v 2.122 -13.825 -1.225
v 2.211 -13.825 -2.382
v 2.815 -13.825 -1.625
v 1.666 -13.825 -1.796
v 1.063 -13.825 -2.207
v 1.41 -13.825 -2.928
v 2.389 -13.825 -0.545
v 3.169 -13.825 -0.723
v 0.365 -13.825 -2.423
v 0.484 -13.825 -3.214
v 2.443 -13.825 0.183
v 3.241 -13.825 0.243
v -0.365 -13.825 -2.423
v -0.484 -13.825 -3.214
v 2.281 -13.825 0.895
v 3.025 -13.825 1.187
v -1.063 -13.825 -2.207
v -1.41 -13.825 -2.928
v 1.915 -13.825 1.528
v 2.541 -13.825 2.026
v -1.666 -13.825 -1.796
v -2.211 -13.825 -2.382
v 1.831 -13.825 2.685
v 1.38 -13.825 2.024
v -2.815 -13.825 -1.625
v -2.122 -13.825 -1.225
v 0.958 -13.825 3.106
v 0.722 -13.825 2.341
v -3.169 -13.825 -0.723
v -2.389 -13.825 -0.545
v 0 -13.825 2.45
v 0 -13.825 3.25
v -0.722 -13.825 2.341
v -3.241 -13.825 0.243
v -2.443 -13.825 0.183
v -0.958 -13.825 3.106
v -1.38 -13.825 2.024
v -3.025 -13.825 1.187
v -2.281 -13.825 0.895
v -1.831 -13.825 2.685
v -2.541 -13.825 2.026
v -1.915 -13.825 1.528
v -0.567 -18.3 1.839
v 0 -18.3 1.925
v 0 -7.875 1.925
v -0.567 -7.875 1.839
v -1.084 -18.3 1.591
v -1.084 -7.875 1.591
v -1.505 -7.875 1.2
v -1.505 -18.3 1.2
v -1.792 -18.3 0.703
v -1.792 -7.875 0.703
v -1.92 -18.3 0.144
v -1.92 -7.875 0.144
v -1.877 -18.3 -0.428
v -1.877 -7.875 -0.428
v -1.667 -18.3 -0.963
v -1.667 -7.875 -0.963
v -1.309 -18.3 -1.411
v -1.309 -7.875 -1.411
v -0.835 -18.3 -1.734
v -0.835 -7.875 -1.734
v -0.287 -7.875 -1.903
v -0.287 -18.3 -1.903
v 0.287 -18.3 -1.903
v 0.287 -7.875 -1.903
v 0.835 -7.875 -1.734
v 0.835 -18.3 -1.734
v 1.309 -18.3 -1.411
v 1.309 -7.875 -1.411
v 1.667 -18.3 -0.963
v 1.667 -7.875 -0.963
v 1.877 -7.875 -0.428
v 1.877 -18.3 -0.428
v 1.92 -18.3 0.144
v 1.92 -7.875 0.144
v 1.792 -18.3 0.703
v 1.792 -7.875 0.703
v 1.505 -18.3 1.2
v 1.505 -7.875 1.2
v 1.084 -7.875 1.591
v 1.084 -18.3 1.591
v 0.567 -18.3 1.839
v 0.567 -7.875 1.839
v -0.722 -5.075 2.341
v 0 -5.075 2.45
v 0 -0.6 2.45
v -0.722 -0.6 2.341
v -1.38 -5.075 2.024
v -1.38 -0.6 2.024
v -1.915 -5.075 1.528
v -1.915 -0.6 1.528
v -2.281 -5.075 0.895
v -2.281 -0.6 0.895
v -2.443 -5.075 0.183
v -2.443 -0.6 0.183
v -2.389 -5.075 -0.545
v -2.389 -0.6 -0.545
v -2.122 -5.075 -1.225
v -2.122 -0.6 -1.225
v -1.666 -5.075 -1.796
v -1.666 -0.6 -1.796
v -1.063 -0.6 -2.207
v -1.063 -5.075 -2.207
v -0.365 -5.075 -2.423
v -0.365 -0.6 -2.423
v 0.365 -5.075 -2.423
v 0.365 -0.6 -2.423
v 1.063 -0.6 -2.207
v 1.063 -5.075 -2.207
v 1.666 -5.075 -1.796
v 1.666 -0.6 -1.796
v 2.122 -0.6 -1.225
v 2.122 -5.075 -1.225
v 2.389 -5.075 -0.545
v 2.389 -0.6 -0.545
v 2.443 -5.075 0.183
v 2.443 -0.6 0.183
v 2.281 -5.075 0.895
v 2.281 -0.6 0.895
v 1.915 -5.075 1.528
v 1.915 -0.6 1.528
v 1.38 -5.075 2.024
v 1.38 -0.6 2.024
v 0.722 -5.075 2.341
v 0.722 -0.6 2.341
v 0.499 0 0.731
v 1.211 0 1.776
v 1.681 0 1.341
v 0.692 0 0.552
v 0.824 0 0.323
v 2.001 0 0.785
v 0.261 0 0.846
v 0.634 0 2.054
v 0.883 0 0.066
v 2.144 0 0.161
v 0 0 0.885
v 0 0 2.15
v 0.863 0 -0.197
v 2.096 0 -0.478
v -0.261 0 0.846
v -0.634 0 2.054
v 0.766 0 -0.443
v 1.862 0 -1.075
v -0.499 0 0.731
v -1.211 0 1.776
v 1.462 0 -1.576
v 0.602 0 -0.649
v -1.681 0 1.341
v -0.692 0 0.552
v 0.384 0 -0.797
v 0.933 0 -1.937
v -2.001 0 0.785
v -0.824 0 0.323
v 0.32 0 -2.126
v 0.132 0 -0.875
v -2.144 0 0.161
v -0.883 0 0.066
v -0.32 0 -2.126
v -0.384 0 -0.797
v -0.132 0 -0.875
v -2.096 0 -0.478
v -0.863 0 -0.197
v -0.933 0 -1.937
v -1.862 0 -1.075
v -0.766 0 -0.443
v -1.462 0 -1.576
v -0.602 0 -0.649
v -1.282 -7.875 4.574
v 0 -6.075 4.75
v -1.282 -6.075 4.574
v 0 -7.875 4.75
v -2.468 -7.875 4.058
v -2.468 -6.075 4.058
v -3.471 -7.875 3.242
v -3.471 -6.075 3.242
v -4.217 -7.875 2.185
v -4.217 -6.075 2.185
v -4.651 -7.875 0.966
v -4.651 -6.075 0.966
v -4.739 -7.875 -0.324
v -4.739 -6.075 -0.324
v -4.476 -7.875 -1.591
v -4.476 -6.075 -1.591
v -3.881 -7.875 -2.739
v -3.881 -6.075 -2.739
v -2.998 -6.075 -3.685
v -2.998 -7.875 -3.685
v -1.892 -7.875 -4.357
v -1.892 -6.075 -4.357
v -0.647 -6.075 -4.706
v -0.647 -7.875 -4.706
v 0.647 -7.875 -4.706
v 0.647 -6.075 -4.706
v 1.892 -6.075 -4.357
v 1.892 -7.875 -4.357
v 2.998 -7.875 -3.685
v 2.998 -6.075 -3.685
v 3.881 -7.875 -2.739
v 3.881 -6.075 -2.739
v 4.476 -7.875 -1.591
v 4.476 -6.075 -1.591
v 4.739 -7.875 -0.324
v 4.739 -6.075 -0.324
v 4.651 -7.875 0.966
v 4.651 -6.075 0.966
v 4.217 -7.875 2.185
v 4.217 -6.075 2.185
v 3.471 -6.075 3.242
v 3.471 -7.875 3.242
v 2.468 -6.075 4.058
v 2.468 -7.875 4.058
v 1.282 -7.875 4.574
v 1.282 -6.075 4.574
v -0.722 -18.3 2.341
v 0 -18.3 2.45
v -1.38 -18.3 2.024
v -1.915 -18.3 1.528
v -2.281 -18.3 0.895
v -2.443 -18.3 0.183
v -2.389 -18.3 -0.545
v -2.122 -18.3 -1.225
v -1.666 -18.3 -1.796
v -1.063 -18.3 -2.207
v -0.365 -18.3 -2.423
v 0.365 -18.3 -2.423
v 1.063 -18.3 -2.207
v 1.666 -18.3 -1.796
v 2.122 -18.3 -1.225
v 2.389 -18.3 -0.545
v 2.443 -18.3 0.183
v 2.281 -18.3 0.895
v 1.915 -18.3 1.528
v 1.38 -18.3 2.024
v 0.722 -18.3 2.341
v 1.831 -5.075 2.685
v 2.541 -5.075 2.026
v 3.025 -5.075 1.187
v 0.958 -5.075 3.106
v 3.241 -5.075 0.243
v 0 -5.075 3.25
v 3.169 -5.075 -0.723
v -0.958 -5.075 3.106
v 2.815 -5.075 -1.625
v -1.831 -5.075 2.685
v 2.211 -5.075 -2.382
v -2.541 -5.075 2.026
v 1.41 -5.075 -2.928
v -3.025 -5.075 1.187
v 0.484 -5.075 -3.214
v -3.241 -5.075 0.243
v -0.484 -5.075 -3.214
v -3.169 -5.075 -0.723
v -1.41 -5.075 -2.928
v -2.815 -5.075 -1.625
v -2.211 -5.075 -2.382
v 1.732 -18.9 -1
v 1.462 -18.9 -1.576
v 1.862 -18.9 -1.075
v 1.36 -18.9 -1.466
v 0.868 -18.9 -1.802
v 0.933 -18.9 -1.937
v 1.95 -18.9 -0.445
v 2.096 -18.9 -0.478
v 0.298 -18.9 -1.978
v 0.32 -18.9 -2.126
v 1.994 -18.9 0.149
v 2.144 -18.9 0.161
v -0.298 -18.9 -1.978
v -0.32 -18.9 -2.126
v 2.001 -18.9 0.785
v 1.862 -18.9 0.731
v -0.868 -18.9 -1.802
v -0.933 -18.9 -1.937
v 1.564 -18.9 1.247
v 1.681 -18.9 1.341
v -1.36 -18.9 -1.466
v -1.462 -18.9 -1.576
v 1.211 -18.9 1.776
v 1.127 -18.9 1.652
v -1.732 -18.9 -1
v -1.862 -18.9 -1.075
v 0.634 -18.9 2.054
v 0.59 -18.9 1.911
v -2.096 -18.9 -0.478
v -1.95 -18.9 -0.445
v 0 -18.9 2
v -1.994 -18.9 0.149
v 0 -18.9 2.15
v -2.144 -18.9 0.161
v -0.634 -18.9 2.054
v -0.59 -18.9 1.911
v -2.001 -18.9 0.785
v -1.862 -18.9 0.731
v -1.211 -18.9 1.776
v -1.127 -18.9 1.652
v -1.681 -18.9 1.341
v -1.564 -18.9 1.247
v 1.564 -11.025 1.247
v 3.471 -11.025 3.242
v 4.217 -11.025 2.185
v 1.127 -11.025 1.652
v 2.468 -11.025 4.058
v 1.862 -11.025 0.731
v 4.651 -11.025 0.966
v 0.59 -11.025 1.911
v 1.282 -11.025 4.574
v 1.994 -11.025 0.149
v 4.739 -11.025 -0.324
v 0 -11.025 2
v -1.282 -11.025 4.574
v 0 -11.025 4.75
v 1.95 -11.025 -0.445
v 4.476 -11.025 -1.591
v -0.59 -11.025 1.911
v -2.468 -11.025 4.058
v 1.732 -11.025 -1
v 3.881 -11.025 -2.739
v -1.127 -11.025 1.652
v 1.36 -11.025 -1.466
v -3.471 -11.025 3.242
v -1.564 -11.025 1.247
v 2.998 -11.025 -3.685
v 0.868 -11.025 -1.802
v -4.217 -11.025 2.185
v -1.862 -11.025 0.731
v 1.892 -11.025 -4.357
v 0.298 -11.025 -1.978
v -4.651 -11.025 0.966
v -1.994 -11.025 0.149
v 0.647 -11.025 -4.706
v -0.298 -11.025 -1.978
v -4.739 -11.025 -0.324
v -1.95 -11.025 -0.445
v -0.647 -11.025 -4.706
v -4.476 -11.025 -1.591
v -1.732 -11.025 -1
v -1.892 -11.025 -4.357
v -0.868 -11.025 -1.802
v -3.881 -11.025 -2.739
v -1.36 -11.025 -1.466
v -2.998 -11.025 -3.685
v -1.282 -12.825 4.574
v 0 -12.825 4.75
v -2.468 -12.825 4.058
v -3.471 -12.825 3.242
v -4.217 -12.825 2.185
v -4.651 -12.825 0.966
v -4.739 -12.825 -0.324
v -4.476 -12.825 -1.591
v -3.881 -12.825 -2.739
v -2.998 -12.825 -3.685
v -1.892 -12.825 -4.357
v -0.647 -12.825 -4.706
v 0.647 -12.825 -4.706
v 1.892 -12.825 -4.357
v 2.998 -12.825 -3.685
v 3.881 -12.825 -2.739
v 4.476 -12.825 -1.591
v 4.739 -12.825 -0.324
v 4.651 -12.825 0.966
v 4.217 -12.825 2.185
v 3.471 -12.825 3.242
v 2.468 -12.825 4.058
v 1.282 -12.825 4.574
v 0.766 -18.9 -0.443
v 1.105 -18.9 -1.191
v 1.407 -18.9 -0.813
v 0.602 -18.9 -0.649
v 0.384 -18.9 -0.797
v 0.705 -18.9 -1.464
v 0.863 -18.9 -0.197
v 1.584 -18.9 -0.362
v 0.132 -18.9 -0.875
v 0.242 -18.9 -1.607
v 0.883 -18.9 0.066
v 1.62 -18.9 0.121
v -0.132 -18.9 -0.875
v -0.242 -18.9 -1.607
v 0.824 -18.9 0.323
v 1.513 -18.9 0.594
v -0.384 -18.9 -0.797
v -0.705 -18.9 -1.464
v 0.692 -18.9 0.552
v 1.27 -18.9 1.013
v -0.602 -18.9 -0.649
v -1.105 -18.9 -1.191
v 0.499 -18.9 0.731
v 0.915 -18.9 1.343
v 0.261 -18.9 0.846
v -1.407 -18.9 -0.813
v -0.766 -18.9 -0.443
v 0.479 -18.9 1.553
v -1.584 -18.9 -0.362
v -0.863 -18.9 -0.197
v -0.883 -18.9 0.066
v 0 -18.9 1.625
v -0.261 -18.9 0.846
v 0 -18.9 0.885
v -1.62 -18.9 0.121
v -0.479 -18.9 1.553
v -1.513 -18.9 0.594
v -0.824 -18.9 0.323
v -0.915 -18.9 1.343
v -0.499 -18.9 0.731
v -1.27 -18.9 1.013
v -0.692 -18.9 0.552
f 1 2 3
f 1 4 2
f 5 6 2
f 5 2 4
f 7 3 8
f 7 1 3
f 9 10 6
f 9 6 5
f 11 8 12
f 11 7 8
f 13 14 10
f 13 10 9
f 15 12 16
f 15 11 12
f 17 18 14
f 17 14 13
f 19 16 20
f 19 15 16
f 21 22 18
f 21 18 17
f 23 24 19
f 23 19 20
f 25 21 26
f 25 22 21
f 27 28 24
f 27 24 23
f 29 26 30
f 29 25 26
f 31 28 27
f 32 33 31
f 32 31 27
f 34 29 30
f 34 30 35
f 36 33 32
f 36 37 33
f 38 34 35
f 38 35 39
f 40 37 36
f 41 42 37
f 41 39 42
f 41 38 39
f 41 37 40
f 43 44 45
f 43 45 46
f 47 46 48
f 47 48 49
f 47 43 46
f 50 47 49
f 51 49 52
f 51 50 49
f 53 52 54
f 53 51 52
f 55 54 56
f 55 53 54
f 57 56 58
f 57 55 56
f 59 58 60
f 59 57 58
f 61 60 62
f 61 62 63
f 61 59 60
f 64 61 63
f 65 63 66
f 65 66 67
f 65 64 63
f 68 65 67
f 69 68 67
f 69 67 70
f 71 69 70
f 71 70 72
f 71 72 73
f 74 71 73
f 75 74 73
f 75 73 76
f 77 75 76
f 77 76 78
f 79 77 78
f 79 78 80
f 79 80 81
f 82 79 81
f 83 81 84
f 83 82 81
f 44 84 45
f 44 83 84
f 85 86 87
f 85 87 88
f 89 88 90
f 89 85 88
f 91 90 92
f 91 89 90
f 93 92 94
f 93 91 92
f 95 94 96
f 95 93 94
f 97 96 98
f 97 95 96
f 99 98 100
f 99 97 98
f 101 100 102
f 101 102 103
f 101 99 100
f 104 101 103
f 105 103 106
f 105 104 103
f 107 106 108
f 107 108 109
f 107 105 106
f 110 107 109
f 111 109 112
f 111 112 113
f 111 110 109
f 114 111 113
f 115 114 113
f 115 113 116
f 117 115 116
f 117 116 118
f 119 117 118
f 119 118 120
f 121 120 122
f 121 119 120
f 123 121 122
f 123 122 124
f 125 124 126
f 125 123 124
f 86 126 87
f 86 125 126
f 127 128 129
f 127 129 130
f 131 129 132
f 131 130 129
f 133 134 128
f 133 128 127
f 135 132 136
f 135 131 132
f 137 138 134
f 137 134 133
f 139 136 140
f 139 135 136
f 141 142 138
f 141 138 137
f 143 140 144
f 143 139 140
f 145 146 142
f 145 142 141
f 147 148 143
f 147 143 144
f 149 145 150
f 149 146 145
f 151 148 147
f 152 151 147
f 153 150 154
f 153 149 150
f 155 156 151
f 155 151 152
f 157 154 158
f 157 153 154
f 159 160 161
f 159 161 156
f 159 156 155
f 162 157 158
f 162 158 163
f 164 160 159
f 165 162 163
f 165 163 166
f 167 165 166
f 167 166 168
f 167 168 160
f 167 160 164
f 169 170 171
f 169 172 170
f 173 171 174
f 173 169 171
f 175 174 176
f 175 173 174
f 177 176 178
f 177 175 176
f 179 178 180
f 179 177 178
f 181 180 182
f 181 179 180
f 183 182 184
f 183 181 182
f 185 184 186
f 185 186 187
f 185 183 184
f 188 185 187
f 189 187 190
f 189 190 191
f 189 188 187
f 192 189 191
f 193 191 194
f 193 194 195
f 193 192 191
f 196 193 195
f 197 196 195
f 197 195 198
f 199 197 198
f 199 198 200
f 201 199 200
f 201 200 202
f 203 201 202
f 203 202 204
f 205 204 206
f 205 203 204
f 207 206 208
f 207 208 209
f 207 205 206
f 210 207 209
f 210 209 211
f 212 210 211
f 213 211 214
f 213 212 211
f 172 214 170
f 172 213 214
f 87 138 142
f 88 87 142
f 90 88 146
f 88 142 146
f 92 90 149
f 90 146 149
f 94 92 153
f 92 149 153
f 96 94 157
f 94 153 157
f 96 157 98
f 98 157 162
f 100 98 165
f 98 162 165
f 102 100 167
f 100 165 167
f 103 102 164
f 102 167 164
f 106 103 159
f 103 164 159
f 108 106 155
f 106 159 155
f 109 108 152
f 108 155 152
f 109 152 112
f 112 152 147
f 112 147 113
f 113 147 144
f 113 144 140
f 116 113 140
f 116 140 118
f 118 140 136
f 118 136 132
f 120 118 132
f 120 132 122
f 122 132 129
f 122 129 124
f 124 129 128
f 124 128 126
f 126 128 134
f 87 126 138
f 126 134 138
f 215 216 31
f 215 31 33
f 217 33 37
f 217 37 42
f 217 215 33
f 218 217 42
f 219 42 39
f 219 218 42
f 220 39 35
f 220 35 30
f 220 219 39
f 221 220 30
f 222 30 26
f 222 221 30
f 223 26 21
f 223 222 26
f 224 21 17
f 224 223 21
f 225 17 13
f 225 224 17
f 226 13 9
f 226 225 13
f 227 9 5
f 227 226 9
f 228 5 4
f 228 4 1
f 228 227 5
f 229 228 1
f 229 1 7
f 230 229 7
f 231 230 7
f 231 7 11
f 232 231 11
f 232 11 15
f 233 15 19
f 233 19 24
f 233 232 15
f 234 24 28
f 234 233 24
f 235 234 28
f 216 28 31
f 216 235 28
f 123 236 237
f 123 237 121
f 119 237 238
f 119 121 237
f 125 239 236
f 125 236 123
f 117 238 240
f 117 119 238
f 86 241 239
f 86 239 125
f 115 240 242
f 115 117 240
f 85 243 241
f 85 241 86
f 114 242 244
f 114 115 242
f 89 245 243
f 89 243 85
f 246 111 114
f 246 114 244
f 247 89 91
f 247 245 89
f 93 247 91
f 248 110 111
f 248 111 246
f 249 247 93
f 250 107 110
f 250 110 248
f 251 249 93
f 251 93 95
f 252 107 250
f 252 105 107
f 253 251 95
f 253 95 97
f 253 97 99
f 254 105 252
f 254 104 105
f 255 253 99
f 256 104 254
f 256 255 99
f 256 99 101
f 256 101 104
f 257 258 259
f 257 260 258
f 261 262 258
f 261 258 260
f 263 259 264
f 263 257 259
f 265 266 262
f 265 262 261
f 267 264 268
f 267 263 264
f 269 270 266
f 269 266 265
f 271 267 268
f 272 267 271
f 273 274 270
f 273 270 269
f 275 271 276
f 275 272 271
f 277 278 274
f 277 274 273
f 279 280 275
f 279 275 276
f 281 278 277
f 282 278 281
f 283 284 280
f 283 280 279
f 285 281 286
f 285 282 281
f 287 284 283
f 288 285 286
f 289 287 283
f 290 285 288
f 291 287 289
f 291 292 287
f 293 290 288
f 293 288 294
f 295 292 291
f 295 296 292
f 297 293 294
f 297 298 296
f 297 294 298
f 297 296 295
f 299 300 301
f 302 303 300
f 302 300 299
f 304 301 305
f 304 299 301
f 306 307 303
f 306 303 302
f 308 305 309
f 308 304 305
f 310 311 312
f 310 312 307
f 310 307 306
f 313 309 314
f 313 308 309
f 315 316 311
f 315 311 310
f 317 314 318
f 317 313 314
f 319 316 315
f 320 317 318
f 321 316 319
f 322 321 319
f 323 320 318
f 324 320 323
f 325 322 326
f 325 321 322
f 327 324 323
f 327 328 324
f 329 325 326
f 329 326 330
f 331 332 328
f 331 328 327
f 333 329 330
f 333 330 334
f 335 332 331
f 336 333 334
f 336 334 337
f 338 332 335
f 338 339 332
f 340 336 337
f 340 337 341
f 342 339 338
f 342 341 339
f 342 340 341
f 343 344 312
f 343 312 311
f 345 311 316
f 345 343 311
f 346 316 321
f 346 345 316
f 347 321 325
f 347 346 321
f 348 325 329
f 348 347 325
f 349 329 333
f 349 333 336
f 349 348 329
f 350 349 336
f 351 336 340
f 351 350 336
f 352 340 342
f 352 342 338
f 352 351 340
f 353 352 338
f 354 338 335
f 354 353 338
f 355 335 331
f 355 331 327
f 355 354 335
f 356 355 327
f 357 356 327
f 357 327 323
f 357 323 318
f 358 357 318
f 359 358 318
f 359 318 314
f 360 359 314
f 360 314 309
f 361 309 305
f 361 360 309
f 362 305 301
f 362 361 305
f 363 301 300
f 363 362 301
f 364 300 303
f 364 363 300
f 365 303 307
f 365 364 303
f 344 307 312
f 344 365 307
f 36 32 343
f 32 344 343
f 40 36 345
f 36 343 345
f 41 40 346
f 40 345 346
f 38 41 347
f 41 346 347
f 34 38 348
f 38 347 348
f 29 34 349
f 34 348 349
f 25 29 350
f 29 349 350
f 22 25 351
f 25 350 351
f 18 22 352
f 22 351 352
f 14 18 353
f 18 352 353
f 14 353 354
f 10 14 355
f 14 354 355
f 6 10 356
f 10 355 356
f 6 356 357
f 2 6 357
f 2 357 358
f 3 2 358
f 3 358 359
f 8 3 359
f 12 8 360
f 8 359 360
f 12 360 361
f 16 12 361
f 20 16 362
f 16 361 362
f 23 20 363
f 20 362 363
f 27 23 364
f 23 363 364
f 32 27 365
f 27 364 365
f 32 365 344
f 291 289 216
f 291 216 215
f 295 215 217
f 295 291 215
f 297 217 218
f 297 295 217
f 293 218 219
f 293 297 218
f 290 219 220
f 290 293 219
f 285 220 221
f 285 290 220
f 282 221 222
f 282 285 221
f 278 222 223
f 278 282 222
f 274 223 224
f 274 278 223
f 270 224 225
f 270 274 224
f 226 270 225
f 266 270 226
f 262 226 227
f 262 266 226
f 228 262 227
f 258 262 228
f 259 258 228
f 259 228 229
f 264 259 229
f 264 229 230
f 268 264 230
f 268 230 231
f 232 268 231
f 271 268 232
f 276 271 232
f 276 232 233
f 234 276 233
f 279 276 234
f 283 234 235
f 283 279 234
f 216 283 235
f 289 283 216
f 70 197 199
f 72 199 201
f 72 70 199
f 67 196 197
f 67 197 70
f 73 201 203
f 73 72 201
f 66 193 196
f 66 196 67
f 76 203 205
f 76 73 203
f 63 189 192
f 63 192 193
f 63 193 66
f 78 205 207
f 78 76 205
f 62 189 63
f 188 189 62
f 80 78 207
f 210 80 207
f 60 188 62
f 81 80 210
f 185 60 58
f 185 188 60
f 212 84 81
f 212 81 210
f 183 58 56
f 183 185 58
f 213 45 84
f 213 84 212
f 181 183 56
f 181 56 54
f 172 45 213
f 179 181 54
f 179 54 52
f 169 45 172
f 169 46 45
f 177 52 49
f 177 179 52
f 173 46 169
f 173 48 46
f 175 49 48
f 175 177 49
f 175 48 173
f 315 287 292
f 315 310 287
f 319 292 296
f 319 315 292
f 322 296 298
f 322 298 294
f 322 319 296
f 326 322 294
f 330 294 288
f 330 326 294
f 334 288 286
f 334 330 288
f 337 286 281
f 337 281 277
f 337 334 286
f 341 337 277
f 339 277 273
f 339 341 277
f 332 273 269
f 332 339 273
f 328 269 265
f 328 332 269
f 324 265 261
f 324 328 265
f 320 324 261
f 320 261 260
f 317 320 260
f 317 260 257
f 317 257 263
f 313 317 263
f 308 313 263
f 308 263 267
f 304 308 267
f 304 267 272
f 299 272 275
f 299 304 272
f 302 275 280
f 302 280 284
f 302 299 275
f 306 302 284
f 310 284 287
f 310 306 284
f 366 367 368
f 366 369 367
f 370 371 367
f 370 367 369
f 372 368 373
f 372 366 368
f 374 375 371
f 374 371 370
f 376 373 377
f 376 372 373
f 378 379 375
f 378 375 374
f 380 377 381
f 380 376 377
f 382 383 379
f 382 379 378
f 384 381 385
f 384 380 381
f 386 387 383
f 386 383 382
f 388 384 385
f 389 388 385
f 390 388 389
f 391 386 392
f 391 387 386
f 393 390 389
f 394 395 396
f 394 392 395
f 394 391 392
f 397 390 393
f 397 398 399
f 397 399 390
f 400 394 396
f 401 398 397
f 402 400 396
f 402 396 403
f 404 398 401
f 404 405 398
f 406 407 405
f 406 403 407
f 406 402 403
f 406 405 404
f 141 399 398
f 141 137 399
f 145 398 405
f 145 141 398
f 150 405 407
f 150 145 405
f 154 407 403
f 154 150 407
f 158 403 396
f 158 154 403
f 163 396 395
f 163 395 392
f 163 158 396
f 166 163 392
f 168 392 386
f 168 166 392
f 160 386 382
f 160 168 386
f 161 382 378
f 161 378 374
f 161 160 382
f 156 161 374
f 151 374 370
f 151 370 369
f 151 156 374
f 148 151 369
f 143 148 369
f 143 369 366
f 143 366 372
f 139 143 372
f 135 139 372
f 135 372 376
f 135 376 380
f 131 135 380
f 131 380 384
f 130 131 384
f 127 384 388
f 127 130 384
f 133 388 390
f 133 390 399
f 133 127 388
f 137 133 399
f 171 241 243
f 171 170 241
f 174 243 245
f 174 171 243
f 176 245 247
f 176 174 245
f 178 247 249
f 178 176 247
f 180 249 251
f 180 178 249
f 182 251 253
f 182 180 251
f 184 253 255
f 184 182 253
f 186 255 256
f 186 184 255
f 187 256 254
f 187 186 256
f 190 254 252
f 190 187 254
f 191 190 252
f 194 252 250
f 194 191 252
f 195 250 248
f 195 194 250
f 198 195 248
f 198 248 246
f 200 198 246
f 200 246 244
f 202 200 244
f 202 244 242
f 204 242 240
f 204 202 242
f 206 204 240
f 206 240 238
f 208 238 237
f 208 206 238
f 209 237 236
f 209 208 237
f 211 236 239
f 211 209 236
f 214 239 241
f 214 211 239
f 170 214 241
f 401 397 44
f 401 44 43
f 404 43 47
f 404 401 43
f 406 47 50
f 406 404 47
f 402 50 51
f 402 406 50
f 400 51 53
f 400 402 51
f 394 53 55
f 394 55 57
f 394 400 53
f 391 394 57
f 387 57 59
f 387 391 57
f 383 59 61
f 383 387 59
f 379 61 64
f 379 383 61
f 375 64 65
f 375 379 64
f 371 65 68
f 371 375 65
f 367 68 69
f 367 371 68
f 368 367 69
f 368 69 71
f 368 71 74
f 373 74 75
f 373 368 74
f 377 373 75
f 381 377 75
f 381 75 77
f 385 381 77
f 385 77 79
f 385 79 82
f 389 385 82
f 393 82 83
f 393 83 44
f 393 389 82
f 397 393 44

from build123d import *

# Parameters (mm, degrees)
F2_SIZE2   = 0.3
F2_SIZE    = 0.6
F2_2_SIZE2 = 0.3
F2_2_SIZE  = 0.6
F2_3_SIZE2 = 0.3
F2_3_SIZE  = 0.6


# Not quite as in the source:
# - a fillet or chamfer that OpenCascade refuses, or shapes differently, is made with other operations: its cross-section is extruded or revolved along the edge and cut away or added
# - two fillets or chamfers of one size are made in one step


with BuildPart() as f1:
    # F0 (on Right) → F1 (revolve)
    with BuildSketch(Plane.YZ):
        Polygon((-18.9, 1.925), (-18.9, 0.885), (0, 0.885), (0, 2.45), (-5.075, 2.45), (-5.075, 4.75), (-7.875, 4.75), (-7.875, 1.925), align=None)
    revolve(axis=Axis((0, -9.45, 0), (0, -1, 0)))

    # F2
    f2_edges = [f1.edges().sort_by_distance(p)[0] for p in [
        (0, -18.9, -1.925),
    ]]
    f2_side = f1.faces().sort_by_distance((0, -13.3875, -1.925))[0]
    chamfer(f2_edges, length=F2_SIZE, length2=F2_SIZE2, reference=f2_side)

    # F2#2
    f2_2_edges = [f1.edges().sort_by_distance(p)[0] for p in [
        (0, 0, -2.45),
    ]]
    f2_2_side = f1.faces().sort_by_distance((0, -2.5375, -2.45))[0]
    chamfer(f2_2_edges, length=F2_2_SIZE, length2=F2_2_SIZE2, reference=f2_2_side)

    # F4#2: chamfer of 1 x 1.5 on 1 edges, made by hand

    # F4_2_s1 → F4_2_t2 (revolve, cut)
    with BuildSketch(Plane.YZ):
        Polygon((-5.075, 3.25), (-6.075, 4.75), (-5.075, 4.75), align=None)
    revolve(axis=Axis((0, -5.075, 0), (0, -1, 0)), mode=Mode.SUBTRACT)


with BuildPart() as f1b:
    # F0 (on Right) → F1, piece 2 (revolve)
    with BuildSketch(Plane.YZ):
        Polygon((-18.9, 2.45), (-18.9, 2), (-11.025, 2), (-11.025, 4.75), (-13.825, 4.75), (-13.825, 2.45), align=None)
    revolve(axis=Axis((0, -9.45, 0), (0, -1, 0)))

    # F2#3
    f2_3_edges = [f1b.edges().sort_by_distance(p)[0] for p in [
        (0, -18.9, -2.45),
    ]]
    f2_3_side = f1b.faces().sort_by_distance((0, -16.3625, -2.45))[0]
    chamfer(f2_3_edges, length=F2_3_SIZE, length2=F2_3_SIZE2, reference=f2_3_side)

    # F4: chamfer of 1 x 1.5 on 1 edges, made by hand

    # F4_s1 → F4_t2 (revolve, cut)
    with BuildSketch(Plane.YZ):
        Polygon((-13.825, 3.25), (-12.825, 4.75), (-13.825, 4.75), align=None)
    revolve(axis=Axis((0, -13.825, 0), (0, -1, 0)), mode=Mode.SUBTRACT)


solid = Compound([f1.part, f1b.part])
